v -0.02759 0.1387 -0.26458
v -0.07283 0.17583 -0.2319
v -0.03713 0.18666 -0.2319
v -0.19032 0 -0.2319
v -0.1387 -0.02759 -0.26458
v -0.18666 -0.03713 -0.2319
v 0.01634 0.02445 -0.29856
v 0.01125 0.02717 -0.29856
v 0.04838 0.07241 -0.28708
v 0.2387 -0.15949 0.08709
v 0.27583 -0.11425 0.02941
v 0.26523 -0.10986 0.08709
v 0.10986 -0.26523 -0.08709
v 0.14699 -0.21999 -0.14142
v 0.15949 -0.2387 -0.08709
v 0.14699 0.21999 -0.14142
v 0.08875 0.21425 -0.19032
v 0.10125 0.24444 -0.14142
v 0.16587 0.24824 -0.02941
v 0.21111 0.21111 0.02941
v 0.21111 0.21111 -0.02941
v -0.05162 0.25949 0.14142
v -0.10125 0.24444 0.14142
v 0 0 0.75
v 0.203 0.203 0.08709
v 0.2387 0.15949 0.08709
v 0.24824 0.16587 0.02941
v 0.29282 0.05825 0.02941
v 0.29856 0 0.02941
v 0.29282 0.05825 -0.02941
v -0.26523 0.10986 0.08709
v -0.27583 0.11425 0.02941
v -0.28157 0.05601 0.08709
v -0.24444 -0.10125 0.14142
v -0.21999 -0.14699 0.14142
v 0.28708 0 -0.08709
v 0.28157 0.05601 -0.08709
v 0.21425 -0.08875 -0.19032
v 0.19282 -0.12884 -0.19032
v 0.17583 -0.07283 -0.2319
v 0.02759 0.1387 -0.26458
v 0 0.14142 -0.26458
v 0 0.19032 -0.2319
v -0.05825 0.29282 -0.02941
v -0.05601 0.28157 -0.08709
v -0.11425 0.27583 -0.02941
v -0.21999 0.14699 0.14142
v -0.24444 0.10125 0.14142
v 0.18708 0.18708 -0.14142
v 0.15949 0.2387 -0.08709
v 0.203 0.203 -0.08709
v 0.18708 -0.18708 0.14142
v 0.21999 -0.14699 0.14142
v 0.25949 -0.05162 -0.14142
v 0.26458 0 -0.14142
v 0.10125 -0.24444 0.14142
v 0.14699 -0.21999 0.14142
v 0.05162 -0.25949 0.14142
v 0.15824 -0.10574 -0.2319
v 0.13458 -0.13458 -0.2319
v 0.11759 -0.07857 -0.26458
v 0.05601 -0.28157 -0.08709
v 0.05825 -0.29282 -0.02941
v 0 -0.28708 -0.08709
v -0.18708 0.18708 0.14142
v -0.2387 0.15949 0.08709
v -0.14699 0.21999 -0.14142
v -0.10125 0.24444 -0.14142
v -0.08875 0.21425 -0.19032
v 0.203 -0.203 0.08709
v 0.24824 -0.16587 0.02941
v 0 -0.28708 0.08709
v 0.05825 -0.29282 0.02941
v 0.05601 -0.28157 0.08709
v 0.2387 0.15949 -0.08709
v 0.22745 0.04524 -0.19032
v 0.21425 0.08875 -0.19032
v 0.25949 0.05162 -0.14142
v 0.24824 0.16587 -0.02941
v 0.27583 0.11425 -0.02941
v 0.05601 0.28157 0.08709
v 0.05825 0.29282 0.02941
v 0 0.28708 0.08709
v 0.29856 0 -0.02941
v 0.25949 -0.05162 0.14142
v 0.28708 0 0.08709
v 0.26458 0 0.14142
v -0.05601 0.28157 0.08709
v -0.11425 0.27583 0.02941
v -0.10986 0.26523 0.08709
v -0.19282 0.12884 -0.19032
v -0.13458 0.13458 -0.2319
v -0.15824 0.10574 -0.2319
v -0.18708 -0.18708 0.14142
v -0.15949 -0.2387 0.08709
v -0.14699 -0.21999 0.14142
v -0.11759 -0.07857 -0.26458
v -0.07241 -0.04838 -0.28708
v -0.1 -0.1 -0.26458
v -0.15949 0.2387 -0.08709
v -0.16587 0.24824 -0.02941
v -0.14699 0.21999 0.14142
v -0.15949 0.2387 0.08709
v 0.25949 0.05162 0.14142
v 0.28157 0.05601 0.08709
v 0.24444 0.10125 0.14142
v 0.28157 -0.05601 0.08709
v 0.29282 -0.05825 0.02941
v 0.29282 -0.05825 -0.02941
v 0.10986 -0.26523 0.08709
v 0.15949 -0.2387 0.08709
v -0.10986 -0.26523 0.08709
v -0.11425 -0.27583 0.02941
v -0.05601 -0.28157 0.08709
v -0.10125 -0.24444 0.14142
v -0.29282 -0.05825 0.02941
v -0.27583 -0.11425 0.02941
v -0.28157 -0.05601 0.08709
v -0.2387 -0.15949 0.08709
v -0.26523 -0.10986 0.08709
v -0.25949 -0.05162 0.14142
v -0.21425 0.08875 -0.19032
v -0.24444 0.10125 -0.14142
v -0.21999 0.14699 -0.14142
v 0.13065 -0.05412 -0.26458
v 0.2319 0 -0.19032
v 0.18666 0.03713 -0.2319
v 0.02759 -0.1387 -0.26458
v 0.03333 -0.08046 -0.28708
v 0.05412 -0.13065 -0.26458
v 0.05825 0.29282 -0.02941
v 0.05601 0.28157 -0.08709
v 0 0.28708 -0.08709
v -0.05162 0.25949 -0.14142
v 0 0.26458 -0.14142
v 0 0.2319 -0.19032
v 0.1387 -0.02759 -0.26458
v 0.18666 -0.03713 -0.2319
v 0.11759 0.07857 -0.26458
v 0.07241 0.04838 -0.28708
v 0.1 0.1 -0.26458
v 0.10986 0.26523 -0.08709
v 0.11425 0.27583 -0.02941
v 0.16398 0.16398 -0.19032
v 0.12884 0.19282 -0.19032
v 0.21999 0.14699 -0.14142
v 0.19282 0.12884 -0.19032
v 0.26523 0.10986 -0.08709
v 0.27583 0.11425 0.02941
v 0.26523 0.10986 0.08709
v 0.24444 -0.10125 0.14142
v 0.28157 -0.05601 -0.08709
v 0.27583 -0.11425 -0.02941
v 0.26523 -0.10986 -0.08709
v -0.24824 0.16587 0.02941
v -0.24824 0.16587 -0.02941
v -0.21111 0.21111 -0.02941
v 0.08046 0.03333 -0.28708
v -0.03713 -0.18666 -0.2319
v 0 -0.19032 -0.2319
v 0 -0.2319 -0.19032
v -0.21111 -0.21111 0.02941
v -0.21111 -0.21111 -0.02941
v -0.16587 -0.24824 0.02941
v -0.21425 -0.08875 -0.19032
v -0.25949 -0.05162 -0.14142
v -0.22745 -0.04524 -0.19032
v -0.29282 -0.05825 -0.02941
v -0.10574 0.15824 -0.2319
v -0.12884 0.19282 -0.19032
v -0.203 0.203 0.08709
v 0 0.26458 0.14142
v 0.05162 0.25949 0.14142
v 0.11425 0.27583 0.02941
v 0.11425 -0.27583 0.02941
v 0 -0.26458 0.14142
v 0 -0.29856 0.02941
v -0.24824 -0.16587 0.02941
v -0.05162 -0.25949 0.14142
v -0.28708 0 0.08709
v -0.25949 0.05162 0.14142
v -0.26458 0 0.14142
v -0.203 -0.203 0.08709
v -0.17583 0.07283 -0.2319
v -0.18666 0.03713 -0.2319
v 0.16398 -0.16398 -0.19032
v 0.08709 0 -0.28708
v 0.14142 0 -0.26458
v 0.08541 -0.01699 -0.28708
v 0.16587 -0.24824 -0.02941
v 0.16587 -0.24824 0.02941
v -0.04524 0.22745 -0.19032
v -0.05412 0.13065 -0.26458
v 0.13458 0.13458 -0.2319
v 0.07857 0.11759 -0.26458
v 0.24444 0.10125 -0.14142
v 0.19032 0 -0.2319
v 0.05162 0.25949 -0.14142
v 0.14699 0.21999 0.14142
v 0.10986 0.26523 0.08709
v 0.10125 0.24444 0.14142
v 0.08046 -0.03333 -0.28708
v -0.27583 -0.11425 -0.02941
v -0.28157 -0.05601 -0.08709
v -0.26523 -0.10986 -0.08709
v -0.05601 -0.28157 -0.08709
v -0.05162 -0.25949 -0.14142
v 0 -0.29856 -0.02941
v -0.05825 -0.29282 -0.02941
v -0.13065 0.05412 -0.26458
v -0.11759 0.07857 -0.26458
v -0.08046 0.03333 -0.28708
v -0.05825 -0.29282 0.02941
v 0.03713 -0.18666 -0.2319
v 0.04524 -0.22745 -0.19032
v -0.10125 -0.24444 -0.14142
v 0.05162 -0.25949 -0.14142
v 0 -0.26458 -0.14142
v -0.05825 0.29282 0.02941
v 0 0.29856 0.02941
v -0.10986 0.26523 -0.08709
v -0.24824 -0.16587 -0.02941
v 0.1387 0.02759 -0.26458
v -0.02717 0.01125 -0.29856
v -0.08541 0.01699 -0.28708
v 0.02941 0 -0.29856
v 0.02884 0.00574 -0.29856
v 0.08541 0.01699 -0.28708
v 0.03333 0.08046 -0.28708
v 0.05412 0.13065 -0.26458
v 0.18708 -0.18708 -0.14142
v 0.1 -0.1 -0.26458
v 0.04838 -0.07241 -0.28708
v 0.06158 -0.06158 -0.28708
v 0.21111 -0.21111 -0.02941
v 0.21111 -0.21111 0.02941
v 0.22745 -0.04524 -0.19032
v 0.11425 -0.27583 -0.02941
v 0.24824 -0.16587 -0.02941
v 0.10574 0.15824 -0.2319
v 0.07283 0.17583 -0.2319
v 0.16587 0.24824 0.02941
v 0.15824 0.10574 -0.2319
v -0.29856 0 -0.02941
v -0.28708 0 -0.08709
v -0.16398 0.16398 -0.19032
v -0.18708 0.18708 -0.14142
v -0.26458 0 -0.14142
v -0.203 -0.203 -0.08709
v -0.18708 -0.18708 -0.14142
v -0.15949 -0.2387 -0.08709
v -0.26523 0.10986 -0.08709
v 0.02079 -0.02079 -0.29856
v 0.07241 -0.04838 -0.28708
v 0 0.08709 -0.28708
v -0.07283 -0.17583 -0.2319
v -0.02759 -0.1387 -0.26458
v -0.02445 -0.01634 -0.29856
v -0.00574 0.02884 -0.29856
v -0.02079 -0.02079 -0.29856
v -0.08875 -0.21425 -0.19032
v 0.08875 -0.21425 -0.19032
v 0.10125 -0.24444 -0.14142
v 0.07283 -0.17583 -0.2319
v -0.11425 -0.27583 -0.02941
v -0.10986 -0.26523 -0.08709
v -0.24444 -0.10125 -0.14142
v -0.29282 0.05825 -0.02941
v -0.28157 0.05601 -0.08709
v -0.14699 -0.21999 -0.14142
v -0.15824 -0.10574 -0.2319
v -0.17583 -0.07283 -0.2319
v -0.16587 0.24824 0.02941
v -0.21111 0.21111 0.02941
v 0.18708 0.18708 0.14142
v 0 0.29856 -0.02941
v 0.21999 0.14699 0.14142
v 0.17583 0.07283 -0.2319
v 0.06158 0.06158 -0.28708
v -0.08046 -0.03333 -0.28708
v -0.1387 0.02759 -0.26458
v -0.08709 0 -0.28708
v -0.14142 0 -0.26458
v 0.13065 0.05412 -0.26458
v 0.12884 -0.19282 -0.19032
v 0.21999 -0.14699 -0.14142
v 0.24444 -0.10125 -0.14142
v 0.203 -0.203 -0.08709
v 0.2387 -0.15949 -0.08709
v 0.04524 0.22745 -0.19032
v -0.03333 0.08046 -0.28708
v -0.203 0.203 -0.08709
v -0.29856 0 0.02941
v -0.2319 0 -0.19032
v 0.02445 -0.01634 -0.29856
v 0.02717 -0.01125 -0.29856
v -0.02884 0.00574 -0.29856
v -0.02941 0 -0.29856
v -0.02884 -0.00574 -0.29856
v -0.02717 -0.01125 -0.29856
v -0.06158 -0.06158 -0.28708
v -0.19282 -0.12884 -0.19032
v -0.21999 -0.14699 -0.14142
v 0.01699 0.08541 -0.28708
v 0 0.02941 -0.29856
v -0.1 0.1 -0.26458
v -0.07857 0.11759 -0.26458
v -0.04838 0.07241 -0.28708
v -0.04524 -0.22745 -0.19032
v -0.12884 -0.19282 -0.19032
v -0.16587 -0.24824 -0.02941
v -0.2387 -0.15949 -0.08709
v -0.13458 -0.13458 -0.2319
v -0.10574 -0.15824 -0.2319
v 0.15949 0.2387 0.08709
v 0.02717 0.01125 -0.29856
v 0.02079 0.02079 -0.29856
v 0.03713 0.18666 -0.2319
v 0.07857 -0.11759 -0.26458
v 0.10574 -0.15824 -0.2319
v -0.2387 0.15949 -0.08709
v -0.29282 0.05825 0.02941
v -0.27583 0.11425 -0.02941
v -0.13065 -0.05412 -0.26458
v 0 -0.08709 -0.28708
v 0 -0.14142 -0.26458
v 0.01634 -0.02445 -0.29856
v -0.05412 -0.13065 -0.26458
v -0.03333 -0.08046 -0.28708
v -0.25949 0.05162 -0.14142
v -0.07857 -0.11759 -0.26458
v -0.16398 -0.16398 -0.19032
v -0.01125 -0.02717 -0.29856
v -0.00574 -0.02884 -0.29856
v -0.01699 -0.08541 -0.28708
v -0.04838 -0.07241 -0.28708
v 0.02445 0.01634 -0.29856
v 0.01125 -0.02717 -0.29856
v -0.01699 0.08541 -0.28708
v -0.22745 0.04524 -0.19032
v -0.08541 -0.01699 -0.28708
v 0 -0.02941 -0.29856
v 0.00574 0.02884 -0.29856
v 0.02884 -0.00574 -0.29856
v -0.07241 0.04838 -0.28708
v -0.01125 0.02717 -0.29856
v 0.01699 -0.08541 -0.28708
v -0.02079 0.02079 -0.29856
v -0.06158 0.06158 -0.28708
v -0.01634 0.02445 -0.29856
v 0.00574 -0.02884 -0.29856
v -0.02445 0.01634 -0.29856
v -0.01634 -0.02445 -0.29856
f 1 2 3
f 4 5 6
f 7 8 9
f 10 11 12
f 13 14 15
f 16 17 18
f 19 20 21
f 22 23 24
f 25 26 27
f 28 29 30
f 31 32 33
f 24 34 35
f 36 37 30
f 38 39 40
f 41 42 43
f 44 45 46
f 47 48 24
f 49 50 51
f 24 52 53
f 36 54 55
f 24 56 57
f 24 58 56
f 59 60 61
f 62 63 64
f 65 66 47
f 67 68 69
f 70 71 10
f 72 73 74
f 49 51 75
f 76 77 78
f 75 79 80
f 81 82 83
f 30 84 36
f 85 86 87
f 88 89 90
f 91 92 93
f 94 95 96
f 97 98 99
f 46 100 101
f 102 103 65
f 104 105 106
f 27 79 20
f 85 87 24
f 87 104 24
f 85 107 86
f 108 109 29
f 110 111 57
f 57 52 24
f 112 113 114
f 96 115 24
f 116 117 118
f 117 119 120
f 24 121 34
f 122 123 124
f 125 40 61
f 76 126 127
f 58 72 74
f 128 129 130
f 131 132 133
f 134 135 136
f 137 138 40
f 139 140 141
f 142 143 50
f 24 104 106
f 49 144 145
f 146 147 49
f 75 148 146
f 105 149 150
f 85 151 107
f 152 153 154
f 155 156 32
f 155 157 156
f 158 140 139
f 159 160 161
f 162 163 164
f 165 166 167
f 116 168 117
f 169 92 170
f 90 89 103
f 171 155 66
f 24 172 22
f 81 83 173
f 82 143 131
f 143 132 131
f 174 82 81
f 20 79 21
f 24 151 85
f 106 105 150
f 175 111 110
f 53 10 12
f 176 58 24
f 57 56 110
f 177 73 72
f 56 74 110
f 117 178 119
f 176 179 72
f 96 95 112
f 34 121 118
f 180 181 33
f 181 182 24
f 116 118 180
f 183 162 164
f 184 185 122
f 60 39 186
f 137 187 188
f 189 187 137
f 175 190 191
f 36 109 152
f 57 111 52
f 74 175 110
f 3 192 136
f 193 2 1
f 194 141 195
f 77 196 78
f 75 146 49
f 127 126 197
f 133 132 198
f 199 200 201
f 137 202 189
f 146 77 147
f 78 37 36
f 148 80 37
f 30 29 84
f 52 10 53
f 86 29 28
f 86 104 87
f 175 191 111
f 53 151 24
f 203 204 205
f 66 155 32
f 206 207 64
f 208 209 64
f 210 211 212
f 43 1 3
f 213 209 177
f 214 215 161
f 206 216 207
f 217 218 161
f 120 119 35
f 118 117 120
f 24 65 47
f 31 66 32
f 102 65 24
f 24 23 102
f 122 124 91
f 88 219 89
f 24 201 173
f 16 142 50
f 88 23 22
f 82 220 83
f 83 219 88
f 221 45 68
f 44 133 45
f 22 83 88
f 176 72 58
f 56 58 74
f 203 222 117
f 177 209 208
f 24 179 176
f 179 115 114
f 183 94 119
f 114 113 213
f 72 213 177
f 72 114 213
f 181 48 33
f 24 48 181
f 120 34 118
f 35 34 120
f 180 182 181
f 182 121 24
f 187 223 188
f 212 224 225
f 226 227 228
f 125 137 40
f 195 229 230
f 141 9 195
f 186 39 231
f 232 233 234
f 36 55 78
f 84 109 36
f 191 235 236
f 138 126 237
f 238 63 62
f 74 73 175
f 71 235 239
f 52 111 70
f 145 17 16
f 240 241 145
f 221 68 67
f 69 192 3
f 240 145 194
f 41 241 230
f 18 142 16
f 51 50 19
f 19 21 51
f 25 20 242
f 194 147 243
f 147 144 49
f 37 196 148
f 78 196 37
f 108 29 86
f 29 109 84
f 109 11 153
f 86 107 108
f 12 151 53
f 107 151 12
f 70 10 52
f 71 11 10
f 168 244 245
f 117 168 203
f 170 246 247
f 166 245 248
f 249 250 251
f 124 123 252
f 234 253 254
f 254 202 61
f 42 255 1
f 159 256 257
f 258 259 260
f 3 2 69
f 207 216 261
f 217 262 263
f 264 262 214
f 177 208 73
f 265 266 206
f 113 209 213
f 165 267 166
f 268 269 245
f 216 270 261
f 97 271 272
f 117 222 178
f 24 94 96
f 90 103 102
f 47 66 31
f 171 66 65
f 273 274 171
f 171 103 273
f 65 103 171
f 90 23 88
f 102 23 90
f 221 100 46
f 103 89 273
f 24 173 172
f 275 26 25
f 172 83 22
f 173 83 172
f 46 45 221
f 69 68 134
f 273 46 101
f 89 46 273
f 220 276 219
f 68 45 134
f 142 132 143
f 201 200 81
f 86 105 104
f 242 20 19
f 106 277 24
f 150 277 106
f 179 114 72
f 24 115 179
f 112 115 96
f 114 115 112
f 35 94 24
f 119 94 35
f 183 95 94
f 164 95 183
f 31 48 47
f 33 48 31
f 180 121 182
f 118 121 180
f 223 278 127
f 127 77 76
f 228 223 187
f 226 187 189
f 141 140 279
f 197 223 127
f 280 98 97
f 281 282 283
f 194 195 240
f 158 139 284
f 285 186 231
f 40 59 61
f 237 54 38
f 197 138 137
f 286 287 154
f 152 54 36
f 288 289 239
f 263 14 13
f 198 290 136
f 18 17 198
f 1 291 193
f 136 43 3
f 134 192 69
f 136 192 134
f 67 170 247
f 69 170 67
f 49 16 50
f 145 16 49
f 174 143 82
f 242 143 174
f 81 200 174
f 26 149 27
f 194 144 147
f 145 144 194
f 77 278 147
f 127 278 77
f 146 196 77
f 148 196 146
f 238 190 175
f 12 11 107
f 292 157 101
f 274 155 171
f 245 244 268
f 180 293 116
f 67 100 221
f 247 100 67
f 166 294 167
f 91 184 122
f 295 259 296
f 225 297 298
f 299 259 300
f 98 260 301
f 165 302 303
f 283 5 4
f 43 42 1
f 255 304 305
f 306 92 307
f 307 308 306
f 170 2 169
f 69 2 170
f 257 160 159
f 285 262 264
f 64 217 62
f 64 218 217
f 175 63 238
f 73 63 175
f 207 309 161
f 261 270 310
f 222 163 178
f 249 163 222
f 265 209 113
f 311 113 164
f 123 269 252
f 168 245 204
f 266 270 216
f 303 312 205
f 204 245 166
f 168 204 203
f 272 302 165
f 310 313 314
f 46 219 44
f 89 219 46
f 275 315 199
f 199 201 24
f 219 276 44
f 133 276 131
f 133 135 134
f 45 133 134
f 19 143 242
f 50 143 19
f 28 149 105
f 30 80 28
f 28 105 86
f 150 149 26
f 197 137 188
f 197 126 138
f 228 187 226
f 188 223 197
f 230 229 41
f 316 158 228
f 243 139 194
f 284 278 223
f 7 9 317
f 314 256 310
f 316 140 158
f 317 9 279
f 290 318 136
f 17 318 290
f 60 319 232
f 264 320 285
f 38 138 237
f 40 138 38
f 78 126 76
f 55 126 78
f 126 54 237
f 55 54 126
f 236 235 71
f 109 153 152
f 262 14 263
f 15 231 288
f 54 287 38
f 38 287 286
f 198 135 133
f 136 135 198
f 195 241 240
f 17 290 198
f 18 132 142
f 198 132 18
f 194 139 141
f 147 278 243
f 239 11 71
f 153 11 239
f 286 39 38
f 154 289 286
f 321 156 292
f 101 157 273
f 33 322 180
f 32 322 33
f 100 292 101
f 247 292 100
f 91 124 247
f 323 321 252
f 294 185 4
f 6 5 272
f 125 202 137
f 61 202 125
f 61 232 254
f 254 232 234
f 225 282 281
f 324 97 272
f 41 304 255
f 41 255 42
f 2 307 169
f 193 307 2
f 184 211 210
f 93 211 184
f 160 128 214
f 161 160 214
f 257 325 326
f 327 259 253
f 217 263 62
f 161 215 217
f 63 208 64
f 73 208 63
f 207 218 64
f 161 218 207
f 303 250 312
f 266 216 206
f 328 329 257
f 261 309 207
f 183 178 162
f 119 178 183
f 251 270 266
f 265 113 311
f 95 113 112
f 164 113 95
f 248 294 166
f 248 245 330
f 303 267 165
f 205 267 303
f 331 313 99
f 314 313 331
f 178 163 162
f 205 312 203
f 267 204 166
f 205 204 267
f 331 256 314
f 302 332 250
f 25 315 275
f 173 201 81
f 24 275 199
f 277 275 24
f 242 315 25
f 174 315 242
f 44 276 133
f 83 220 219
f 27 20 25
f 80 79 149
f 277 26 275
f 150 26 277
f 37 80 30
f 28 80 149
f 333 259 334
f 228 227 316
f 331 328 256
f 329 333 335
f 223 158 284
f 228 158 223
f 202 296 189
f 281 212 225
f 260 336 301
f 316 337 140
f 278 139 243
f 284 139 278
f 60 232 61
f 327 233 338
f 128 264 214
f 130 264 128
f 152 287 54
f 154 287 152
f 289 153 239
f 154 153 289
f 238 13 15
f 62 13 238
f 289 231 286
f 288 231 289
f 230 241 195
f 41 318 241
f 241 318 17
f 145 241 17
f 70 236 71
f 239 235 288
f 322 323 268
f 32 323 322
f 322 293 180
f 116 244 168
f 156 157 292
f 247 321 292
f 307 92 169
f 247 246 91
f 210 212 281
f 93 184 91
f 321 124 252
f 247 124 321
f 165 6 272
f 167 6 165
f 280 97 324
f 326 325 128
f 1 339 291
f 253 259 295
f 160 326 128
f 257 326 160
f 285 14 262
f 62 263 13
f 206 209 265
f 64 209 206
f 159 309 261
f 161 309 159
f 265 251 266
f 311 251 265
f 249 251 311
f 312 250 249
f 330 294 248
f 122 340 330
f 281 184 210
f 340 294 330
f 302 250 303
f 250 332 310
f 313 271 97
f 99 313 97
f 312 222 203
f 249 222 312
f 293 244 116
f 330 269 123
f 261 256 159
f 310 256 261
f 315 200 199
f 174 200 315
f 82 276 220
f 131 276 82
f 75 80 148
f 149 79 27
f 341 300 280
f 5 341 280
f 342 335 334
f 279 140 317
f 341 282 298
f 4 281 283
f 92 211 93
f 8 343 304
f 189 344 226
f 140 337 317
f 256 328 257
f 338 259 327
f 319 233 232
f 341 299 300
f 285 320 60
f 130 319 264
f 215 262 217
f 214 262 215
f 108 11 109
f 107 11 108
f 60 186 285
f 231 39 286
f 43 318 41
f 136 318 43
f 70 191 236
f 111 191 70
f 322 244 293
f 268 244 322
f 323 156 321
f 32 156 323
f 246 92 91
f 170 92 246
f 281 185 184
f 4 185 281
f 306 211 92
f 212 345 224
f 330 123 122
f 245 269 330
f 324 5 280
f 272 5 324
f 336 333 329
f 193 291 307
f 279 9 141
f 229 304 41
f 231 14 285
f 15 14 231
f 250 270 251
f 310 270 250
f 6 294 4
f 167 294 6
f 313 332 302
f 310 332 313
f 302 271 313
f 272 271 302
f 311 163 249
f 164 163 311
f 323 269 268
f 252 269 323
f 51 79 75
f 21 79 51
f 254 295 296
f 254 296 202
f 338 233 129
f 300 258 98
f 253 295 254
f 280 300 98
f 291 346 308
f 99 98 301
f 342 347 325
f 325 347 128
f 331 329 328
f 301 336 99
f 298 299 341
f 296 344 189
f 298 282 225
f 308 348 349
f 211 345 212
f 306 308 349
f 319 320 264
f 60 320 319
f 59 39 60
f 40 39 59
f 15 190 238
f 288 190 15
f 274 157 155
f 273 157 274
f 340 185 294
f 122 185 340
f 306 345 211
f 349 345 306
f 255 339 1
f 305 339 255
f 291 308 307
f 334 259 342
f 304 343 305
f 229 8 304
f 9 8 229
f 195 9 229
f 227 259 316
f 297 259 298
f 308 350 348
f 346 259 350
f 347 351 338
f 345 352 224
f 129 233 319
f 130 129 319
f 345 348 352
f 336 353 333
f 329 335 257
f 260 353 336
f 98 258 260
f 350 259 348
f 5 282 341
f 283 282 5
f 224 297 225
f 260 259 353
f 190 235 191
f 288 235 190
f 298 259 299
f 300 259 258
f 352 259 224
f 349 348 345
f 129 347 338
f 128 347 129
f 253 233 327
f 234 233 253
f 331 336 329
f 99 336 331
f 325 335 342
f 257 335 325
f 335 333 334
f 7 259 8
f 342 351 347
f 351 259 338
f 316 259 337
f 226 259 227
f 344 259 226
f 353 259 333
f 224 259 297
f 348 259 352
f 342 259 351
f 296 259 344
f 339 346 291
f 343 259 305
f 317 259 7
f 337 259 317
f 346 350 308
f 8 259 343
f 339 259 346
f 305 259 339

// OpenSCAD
module droplet() {
	hull() {
	  sphere(r = 0.3);
	  translate([0, 0, 0.3 * sin(30)])
	    cylinder(h = 0.6, r1 = 0.3 * cos(30), r2 = 0);
	}
}

droplet($fn=32);
